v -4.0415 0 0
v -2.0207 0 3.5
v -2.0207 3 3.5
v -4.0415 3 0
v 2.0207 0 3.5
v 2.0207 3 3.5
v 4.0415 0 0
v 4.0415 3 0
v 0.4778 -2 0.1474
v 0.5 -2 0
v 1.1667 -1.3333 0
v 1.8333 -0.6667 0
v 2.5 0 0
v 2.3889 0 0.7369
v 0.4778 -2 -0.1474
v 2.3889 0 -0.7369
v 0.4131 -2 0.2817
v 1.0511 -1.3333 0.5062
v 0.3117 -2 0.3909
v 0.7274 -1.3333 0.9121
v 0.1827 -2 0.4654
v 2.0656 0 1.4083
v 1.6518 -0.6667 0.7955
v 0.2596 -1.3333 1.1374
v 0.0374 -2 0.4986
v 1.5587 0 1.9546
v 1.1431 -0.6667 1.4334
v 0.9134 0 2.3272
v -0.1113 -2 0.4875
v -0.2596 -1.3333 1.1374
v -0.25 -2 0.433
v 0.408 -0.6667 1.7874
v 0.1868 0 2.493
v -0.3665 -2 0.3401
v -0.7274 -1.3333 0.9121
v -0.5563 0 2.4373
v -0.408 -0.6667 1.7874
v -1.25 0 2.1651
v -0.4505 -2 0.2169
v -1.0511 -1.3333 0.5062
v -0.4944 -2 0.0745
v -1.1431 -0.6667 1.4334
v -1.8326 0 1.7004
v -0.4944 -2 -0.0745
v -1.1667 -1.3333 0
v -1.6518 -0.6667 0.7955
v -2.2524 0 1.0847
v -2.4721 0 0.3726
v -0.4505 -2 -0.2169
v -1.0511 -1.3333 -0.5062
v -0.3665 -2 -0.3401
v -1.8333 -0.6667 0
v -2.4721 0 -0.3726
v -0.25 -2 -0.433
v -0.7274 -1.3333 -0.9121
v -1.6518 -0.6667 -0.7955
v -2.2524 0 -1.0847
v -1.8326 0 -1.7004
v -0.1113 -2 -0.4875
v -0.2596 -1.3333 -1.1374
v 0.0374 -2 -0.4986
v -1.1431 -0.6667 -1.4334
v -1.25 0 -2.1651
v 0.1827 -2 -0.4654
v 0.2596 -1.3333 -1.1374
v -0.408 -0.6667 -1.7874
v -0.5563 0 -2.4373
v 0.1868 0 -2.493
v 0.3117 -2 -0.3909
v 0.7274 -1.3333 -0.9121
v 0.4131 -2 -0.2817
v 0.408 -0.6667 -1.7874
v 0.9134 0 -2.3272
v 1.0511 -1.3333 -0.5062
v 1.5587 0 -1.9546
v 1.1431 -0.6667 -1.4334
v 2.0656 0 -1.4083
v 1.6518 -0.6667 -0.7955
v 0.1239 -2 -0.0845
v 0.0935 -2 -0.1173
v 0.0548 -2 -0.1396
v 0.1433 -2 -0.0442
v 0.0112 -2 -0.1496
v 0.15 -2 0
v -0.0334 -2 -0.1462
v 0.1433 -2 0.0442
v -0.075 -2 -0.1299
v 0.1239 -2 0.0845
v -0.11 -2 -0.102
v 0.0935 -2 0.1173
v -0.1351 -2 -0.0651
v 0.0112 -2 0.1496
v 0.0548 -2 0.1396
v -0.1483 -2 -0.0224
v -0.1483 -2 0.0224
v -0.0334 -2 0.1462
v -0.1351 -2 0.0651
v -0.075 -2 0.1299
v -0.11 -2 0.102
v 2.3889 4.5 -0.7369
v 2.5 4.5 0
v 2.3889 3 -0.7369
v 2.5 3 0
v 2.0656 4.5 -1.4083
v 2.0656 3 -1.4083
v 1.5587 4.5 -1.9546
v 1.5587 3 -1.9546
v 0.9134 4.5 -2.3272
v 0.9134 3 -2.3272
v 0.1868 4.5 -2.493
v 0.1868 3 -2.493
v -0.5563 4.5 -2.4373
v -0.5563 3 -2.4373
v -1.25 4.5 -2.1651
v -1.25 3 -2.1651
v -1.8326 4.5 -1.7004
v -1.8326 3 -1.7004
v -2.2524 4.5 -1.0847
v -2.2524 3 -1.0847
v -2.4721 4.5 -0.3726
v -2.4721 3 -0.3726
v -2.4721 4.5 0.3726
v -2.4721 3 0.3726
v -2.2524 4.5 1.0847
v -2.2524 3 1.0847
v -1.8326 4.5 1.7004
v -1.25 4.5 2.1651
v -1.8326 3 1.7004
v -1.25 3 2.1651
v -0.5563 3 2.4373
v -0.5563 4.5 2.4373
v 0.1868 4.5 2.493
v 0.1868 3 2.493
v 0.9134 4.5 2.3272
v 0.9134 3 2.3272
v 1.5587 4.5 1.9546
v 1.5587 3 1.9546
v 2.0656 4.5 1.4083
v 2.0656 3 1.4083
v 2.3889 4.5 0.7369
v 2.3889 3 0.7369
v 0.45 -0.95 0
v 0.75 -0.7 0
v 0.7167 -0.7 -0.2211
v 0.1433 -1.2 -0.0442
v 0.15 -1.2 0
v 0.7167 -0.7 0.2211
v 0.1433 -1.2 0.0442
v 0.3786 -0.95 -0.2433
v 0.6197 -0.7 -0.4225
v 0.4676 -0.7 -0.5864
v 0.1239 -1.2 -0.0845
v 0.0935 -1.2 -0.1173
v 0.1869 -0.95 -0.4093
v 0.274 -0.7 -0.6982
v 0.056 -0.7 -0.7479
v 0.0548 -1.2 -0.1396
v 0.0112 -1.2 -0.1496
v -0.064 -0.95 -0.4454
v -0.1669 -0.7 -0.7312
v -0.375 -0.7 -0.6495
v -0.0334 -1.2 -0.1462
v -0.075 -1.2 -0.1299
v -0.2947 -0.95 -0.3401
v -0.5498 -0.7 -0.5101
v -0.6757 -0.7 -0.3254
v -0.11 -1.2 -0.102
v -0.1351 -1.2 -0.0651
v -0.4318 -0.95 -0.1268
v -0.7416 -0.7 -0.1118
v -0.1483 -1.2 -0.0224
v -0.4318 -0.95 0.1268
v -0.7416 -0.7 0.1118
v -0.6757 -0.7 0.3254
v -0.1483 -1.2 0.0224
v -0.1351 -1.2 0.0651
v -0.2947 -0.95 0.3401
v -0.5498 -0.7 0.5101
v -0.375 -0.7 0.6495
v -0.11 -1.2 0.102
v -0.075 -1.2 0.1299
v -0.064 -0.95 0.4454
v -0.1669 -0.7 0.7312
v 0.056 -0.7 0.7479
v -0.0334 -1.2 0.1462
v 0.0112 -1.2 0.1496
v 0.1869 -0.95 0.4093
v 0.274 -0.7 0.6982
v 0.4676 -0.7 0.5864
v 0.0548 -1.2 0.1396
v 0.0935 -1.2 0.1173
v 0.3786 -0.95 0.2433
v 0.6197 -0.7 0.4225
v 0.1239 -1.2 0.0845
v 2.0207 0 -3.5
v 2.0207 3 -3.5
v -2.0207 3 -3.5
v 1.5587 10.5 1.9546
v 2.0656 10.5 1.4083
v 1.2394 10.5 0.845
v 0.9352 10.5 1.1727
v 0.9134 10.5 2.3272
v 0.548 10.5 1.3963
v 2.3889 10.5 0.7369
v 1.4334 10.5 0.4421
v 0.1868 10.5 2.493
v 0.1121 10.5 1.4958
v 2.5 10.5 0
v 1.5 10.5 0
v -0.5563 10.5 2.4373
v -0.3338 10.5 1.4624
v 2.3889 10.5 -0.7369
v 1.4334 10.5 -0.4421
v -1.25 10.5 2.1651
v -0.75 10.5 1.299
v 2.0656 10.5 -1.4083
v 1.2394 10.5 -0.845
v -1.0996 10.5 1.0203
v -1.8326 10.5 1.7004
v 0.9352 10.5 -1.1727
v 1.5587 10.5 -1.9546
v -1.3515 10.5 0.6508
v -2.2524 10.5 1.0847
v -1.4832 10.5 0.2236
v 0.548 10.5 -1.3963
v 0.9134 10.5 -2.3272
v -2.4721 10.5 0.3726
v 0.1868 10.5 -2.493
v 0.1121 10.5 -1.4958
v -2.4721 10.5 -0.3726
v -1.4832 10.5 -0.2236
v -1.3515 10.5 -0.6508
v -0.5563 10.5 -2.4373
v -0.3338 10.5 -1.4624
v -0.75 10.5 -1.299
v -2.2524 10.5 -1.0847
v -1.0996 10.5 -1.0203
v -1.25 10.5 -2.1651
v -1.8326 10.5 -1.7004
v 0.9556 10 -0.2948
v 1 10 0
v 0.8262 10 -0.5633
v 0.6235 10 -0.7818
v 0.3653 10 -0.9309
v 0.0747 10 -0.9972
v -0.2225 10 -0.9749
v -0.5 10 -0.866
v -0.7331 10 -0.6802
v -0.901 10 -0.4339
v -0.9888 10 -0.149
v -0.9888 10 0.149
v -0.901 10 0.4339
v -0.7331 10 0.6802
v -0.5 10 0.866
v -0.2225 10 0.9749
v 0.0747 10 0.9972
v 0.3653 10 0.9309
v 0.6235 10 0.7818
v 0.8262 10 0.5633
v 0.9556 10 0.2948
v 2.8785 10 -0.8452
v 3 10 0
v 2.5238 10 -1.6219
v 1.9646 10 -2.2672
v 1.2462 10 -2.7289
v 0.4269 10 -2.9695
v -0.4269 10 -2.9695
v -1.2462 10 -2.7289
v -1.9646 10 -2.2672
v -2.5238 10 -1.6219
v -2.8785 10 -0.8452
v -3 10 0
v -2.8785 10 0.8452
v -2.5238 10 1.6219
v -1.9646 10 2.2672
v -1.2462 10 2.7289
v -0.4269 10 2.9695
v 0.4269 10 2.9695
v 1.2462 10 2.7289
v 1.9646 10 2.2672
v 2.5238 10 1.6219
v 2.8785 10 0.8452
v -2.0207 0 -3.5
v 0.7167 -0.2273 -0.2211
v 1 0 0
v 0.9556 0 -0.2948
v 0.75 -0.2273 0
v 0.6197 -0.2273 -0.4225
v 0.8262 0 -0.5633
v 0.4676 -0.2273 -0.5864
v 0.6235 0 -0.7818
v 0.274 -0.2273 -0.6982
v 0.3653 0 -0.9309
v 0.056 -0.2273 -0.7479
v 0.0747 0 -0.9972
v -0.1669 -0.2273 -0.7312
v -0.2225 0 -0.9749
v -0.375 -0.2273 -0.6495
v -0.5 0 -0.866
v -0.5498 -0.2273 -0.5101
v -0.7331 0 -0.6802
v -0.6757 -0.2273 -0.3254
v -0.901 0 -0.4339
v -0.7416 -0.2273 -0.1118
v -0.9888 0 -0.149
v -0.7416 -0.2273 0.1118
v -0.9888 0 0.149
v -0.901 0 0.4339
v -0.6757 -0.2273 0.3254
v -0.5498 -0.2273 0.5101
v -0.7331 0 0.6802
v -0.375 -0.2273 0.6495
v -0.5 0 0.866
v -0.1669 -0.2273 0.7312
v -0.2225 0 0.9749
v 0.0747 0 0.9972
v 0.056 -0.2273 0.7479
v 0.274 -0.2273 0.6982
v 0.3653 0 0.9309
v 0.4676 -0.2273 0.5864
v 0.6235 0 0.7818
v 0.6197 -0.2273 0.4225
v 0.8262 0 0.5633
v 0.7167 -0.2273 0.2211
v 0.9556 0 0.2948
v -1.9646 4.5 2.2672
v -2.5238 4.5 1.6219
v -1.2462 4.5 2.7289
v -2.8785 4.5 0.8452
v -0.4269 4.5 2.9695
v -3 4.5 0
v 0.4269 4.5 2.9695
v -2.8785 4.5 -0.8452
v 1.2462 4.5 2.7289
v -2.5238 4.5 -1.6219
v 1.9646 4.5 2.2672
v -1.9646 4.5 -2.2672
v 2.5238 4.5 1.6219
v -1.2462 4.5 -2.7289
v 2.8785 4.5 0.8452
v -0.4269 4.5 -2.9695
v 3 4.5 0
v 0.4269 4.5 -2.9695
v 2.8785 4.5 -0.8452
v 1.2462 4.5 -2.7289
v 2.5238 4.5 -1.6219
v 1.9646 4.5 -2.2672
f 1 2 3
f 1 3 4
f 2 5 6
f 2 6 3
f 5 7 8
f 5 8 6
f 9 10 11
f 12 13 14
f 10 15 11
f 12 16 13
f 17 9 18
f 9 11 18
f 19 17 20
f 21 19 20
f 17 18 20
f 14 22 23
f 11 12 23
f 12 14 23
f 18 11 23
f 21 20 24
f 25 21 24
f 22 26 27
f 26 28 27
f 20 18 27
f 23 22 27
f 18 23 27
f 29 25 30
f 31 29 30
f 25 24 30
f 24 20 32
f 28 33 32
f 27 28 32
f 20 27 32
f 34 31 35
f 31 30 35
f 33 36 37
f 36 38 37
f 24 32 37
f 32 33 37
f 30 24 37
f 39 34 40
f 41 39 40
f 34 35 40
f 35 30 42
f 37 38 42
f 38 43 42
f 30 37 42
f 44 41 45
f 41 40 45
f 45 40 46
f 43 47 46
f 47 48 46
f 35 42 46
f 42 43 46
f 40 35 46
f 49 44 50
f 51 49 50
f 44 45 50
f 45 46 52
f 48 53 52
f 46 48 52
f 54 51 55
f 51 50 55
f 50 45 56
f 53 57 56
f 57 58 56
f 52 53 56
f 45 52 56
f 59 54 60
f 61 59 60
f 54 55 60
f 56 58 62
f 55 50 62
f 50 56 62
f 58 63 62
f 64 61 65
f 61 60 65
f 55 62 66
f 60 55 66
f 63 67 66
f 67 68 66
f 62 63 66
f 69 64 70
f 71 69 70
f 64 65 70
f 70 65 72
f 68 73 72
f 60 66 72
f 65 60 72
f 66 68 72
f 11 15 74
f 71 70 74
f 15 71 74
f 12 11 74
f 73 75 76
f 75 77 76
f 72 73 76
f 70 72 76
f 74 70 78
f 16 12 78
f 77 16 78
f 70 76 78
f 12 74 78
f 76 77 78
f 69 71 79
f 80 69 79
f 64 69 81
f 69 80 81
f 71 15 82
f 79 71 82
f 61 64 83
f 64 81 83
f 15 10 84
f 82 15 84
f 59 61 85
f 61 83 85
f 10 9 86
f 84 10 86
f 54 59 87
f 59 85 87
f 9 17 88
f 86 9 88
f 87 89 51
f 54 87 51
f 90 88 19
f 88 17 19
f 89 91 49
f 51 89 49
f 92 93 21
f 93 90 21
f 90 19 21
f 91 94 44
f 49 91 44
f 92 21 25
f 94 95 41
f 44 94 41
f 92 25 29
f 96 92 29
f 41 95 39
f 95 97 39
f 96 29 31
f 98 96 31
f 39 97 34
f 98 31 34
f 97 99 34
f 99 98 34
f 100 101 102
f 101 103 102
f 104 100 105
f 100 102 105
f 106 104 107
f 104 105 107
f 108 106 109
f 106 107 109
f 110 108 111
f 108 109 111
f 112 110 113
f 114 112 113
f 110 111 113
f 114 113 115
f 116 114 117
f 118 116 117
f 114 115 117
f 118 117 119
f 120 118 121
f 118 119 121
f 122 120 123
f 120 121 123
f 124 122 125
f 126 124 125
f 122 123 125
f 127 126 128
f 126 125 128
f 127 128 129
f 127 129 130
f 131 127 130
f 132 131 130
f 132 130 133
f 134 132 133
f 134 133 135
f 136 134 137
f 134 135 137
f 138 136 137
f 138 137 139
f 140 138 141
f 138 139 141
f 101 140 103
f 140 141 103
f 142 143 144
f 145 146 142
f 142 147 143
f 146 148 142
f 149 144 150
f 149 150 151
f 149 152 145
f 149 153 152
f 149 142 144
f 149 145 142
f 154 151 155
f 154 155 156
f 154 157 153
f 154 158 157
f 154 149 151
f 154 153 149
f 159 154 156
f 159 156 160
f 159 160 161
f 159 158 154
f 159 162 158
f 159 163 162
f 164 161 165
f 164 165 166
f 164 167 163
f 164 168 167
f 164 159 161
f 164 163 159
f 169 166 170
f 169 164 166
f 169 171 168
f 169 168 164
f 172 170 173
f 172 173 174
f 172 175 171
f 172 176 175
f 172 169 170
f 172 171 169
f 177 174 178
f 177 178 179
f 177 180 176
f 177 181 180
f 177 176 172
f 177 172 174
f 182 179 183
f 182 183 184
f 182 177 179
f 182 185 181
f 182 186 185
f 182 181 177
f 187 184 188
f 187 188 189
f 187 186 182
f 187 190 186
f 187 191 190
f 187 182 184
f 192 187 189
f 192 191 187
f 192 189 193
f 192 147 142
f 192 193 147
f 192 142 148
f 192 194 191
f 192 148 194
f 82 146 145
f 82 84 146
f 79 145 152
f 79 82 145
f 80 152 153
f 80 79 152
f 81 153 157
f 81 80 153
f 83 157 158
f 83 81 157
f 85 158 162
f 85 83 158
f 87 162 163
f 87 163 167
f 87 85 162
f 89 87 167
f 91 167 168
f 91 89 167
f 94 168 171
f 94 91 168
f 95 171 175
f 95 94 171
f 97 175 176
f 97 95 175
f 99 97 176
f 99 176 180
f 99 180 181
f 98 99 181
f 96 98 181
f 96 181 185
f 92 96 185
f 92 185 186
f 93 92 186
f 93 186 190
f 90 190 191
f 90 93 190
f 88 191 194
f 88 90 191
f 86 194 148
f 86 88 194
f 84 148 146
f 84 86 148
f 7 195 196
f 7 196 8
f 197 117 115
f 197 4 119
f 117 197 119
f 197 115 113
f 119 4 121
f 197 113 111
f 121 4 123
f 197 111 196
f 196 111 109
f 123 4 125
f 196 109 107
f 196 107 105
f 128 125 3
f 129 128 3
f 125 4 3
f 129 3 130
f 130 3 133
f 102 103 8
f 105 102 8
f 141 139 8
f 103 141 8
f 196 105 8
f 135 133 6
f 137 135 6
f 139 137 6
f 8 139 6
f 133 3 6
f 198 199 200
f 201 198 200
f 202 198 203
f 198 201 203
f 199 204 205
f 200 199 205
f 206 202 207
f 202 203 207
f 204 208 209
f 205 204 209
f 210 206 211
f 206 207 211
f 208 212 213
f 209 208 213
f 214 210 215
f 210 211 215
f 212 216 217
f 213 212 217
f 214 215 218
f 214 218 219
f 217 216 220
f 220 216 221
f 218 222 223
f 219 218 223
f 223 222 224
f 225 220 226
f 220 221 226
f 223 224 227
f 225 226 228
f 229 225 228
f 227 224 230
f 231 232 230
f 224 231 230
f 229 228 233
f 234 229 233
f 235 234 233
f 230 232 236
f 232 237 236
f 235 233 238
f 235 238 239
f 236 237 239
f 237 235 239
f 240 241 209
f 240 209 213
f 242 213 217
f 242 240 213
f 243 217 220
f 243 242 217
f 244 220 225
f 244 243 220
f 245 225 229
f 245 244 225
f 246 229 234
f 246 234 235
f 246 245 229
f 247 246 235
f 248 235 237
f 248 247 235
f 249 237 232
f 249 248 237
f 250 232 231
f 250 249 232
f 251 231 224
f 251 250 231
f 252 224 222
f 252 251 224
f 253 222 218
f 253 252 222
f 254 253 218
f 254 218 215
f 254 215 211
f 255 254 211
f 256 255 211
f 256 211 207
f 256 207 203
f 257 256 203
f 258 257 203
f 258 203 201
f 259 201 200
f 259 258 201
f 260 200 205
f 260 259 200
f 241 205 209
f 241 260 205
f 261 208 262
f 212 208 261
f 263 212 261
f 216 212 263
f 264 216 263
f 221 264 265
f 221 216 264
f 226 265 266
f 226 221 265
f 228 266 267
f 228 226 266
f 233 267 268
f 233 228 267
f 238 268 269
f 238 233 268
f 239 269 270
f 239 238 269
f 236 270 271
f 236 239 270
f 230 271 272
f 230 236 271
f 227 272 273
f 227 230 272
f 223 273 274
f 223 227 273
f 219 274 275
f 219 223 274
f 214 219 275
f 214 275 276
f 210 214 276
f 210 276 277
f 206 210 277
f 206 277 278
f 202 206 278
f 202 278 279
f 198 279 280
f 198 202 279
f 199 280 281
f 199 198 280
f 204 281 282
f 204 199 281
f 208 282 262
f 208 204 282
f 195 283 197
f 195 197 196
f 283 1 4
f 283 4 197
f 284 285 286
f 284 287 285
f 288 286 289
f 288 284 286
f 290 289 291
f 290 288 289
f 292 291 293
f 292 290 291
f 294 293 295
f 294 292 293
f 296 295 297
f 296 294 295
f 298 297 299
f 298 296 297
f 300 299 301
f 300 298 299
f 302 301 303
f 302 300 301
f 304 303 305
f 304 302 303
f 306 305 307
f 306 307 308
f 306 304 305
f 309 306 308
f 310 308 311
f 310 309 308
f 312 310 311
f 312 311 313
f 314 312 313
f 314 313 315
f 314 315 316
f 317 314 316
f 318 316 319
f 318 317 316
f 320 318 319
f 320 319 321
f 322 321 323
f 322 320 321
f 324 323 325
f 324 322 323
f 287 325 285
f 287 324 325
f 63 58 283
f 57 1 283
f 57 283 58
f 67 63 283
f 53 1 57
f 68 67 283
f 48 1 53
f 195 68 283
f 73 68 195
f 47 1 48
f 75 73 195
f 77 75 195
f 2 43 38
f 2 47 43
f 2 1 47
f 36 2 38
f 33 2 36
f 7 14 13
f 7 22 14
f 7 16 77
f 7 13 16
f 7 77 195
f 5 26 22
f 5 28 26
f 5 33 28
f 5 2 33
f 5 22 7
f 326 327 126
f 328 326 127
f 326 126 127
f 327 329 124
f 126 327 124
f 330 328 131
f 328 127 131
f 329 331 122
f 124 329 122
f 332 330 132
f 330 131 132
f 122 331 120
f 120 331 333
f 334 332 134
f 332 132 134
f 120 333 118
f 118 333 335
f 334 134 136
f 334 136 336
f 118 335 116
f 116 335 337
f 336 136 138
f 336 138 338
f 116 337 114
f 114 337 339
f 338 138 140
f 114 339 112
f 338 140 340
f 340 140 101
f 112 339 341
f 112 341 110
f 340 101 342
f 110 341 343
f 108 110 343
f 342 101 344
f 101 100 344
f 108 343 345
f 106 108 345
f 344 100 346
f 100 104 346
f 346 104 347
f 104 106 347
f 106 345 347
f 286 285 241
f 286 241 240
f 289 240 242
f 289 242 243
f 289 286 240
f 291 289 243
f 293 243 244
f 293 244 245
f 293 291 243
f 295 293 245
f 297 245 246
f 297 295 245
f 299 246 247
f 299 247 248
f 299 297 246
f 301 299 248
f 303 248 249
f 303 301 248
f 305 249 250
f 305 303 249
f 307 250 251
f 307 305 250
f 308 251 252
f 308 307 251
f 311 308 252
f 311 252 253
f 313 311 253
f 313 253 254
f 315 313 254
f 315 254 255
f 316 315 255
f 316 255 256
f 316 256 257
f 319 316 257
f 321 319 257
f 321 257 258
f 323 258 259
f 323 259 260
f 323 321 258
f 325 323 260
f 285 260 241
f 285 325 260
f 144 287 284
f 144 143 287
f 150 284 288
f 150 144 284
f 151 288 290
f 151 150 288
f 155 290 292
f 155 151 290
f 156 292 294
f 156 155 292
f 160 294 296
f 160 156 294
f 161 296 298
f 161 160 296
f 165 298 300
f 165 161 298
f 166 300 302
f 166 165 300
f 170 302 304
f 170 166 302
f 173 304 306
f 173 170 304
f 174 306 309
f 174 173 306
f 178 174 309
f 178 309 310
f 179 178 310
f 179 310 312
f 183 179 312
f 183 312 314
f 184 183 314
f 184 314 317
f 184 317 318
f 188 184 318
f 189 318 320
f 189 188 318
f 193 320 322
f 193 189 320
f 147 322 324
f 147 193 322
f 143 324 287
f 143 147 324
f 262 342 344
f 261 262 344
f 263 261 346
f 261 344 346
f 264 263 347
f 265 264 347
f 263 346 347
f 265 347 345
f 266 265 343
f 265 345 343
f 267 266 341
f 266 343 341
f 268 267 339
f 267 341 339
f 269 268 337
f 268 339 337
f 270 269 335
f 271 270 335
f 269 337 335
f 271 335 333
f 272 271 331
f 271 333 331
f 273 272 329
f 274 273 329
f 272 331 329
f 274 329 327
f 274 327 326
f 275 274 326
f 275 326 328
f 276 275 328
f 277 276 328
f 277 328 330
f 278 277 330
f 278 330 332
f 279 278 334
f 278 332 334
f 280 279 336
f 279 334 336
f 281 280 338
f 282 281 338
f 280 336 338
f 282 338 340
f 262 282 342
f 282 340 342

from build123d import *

# Parameters (mm, degrees)
BOSS_EXTRUDE1_DEPTH = 3
CHAMFER1_SIZE       = 0.5


with BuildPart() as part:
    # Sketch1 → Boss-Extrude1 (new body)
    with BuildSketch(Plane.XZ):
        Polygon((-2.020725942, 3.5), (-4.041451884, 0), (-2.020725942, -3.5), (2.020725942, -3.5), (4.041451884, 0), (2.020725942, 3.5), align=None)
    extrude(amount=-BOSS_EXTRUDE1_DEPTH)

    # Sketch2 → Revolve1 (revolve)
    with BuildSketch(Plane(origin=(0, 0, 0), x_dir=(-1, 0, 0), z_dir=(0, 0, -1))):
        Polygon((-2.5, 3), (0, 3), (0, 10.5), (-3, 10.5), (-3, 4.5), (-2.5, 4.5), align=None)
    revolve(axis=Axis((0, 3, 0), (0, 1, 0)))

    # Sketch3 → Revolve2 (revolve)
    with BuildSketch(Plane.XY):
        Polygon((2.5, 0), (0, 0), (0, -2), (0.5, -2), align=None)
    revolve(axis=Axis((0, 0, 0), (0, -1, 0)))

    # Sketch4 → Cut-Revolve1 (revolve, cut)
    with BuildSketch(Plane(origin=(0, 0, 0), x_dir=(-1, 0, 0), z_dir=(0, 0, -1))):
        Polygon((-0.15, -2), (0, -2), (0, 10.5), (-1, 10.5), (-1, 0), (-0.75, -0.227272727), (-0.75, -0.7), (-0.15, -1.2), align=None)
    revolve(axis=Axis((0, -2, 0), (0, 1, 0)), mode=Mode.SUBTRACT)

    # Chamfer1
    chamfer1_edges = [part.edges().sort_by_distance(p)[0] for p in [
        (-3, 10.5, 0),
        (-1, 10.5, 0),
    ]]
    chamfer(chamfer1_edges, length=CHAMFER1_SIZE)


solid = part.part
